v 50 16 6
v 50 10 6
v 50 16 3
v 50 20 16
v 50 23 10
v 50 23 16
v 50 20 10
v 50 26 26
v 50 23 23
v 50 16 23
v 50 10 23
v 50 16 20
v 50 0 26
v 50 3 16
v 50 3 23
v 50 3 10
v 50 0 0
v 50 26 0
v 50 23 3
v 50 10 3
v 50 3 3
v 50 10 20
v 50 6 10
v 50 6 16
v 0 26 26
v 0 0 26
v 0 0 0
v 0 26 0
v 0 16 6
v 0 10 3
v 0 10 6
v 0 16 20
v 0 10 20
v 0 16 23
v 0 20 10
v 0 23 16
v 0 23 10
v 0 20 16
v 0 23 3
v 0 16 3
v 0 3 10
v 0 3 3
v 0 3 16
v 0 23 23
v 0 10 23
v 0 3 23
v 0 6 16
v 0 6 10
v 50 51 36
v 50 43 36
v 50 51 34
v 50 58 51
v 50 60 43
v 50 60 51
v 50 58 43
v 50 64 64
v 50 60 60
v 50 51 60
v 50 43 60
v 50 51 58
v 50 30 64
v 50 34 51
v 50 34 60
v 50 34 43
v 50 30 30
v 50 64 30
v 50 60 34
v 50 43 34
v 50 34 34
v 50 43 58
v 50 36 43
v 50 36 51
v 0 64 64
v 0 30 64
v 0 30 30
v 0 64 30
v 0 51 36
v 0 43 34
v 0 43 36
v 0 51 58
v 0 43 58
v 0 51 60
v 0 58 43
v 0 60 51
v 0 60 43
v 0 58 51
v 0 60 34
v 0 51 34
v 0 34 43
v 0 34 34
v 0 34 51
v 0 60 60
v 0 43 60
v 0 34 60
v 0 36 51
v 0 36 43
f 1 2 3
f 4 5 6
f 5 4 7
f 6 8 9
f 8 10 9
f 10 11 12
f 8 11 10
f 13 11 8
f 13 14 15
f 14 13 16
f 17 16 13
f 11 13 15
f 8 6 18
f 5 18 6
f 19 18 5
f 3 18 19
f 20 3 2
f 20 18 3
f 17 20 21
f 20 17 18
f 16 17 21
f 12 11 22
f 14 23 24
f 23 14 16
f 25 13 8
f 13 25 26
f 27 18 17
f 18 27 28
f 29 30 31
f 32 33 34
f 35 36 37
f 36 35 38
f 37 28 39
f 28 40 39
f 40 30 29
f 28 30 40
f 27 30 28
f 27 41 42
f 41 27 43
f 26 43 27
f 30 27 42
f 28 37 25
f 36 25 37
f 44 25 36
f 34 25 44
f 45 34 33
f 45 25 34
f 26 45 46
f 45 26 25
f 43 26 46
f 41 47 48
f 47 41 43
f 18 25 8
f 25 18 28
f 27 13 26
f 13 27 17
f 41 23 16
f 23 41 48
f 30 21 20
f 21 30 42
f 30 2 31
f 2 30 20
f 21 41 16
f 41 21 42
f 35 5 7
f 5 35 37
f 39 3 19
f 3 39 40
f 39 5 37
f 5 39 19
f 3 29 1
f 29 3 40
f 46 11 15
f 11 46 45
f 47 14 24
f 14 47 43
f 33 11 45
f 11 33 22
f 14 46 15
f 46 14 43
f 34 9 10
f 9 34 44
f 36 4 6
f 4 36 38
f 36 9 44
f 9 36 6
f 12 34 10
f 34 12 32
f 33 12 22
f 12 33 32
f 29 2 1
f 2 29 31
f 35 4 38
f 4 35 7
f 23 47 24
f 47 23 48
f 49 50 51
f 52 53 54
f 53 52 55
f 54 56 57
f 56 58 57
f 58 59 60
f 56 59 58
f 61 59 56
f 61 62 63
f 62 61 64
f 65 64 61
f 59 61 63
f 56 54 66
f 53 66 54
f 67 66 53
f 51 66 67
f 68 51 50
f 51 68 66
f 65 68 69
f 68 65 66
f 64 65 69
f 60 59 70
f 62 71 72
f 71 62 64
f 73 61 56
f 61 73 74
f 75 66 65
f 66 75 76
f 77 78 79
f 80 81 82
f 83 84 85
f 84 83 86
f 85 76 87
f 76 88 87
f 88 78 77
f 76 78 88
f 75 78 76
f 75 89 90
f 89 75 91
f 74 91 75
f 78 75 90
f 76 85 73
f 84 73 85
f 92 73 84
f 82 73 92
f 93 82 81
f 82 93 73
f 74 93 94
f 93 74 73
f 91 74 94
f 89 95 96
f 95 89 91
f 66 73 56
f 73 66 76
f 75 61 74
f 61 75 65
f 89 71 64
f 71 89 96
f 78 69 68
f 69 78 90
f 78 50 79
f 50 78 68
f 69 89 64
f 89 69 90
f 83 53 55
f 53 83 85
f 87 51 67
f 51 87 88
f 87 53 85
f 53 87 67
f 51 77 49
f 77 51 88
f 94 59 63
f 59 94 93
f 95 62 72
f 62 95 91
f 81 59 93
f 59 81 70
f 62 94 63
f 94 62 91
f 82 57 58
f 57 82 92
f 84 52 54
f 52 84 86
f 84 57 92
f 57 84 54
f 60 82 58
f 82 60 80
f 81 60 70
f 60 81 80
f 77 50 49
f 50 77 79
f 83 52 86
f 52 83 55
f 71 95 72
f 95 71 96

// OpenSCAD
$fa=0.5; // default minimum facet angle is now 0.5
$fs=0.5; // default minimum facet size is now 0.5 mm

/*difference()
{
    cube([60,26,26]);
    
    translate([-1,3,3])
    #cube([62,7,7]);
    
    translate([-1,16,3])
    #cube([62,7,7]);
    
    translate([-1,3,16])
    #cube([62,7,7]);
    
    translate([-1,16,16])
    #cube([62,7,7]);
    
    translate([-1,5,5])
    #cube([62,16,16]);
}*/

module tube_profile_X(x, y, z, longueur, epaisseur = 3, epaisseur_bloc = 3, largeur_bloc = 6, largeur_profile = 20)
{
    ecart = (largeur_profile - largeur_bloc)/2;
    
    difference()
    {
        translate([x,y,z])
        cube([longueur, largeur_profile+2*epaisseur, largeur_profile+2*epaisseur]);
        
        translate([x-1,y+epaisseur,z+epaisseur])
        #cube([longueur+2,ecart,ecart]);
        
        translate([x-1,y+epaisseur+ecart+largeur_bloc,z+epaisseur])
        #cube([longueur+2,ecart,ecart]);
        
        translate([x-1,y+epaisseur,z+epaisseur+ecart+largeur_bloc])
        #cube([longueur+2,ecart,ecart]);
        
        translate([x-1,y+epaisseur+ecart+largeur_bloc,z+epaisseur+ecart+largeur_bloc])
        #cube([longueur+2,ecart,ecart]);
        
        translate([x-1,y+epaisseur+epaisseur_bloc,z+epaisseur+epaisseur_bloc])
        #cube([longueur+2,largeur_profile-2*epaisseur_bloc,largeur_profile-2*epaisseur_bloc]);
    }
}
tube_profile_X(0,0,0,50);
tube_profile_X(x=0,y=30,z=30,longueur=50,epaisseur=4,epaisseur_bloc=2,largeur_bloc=8,largeur_profile=26);
